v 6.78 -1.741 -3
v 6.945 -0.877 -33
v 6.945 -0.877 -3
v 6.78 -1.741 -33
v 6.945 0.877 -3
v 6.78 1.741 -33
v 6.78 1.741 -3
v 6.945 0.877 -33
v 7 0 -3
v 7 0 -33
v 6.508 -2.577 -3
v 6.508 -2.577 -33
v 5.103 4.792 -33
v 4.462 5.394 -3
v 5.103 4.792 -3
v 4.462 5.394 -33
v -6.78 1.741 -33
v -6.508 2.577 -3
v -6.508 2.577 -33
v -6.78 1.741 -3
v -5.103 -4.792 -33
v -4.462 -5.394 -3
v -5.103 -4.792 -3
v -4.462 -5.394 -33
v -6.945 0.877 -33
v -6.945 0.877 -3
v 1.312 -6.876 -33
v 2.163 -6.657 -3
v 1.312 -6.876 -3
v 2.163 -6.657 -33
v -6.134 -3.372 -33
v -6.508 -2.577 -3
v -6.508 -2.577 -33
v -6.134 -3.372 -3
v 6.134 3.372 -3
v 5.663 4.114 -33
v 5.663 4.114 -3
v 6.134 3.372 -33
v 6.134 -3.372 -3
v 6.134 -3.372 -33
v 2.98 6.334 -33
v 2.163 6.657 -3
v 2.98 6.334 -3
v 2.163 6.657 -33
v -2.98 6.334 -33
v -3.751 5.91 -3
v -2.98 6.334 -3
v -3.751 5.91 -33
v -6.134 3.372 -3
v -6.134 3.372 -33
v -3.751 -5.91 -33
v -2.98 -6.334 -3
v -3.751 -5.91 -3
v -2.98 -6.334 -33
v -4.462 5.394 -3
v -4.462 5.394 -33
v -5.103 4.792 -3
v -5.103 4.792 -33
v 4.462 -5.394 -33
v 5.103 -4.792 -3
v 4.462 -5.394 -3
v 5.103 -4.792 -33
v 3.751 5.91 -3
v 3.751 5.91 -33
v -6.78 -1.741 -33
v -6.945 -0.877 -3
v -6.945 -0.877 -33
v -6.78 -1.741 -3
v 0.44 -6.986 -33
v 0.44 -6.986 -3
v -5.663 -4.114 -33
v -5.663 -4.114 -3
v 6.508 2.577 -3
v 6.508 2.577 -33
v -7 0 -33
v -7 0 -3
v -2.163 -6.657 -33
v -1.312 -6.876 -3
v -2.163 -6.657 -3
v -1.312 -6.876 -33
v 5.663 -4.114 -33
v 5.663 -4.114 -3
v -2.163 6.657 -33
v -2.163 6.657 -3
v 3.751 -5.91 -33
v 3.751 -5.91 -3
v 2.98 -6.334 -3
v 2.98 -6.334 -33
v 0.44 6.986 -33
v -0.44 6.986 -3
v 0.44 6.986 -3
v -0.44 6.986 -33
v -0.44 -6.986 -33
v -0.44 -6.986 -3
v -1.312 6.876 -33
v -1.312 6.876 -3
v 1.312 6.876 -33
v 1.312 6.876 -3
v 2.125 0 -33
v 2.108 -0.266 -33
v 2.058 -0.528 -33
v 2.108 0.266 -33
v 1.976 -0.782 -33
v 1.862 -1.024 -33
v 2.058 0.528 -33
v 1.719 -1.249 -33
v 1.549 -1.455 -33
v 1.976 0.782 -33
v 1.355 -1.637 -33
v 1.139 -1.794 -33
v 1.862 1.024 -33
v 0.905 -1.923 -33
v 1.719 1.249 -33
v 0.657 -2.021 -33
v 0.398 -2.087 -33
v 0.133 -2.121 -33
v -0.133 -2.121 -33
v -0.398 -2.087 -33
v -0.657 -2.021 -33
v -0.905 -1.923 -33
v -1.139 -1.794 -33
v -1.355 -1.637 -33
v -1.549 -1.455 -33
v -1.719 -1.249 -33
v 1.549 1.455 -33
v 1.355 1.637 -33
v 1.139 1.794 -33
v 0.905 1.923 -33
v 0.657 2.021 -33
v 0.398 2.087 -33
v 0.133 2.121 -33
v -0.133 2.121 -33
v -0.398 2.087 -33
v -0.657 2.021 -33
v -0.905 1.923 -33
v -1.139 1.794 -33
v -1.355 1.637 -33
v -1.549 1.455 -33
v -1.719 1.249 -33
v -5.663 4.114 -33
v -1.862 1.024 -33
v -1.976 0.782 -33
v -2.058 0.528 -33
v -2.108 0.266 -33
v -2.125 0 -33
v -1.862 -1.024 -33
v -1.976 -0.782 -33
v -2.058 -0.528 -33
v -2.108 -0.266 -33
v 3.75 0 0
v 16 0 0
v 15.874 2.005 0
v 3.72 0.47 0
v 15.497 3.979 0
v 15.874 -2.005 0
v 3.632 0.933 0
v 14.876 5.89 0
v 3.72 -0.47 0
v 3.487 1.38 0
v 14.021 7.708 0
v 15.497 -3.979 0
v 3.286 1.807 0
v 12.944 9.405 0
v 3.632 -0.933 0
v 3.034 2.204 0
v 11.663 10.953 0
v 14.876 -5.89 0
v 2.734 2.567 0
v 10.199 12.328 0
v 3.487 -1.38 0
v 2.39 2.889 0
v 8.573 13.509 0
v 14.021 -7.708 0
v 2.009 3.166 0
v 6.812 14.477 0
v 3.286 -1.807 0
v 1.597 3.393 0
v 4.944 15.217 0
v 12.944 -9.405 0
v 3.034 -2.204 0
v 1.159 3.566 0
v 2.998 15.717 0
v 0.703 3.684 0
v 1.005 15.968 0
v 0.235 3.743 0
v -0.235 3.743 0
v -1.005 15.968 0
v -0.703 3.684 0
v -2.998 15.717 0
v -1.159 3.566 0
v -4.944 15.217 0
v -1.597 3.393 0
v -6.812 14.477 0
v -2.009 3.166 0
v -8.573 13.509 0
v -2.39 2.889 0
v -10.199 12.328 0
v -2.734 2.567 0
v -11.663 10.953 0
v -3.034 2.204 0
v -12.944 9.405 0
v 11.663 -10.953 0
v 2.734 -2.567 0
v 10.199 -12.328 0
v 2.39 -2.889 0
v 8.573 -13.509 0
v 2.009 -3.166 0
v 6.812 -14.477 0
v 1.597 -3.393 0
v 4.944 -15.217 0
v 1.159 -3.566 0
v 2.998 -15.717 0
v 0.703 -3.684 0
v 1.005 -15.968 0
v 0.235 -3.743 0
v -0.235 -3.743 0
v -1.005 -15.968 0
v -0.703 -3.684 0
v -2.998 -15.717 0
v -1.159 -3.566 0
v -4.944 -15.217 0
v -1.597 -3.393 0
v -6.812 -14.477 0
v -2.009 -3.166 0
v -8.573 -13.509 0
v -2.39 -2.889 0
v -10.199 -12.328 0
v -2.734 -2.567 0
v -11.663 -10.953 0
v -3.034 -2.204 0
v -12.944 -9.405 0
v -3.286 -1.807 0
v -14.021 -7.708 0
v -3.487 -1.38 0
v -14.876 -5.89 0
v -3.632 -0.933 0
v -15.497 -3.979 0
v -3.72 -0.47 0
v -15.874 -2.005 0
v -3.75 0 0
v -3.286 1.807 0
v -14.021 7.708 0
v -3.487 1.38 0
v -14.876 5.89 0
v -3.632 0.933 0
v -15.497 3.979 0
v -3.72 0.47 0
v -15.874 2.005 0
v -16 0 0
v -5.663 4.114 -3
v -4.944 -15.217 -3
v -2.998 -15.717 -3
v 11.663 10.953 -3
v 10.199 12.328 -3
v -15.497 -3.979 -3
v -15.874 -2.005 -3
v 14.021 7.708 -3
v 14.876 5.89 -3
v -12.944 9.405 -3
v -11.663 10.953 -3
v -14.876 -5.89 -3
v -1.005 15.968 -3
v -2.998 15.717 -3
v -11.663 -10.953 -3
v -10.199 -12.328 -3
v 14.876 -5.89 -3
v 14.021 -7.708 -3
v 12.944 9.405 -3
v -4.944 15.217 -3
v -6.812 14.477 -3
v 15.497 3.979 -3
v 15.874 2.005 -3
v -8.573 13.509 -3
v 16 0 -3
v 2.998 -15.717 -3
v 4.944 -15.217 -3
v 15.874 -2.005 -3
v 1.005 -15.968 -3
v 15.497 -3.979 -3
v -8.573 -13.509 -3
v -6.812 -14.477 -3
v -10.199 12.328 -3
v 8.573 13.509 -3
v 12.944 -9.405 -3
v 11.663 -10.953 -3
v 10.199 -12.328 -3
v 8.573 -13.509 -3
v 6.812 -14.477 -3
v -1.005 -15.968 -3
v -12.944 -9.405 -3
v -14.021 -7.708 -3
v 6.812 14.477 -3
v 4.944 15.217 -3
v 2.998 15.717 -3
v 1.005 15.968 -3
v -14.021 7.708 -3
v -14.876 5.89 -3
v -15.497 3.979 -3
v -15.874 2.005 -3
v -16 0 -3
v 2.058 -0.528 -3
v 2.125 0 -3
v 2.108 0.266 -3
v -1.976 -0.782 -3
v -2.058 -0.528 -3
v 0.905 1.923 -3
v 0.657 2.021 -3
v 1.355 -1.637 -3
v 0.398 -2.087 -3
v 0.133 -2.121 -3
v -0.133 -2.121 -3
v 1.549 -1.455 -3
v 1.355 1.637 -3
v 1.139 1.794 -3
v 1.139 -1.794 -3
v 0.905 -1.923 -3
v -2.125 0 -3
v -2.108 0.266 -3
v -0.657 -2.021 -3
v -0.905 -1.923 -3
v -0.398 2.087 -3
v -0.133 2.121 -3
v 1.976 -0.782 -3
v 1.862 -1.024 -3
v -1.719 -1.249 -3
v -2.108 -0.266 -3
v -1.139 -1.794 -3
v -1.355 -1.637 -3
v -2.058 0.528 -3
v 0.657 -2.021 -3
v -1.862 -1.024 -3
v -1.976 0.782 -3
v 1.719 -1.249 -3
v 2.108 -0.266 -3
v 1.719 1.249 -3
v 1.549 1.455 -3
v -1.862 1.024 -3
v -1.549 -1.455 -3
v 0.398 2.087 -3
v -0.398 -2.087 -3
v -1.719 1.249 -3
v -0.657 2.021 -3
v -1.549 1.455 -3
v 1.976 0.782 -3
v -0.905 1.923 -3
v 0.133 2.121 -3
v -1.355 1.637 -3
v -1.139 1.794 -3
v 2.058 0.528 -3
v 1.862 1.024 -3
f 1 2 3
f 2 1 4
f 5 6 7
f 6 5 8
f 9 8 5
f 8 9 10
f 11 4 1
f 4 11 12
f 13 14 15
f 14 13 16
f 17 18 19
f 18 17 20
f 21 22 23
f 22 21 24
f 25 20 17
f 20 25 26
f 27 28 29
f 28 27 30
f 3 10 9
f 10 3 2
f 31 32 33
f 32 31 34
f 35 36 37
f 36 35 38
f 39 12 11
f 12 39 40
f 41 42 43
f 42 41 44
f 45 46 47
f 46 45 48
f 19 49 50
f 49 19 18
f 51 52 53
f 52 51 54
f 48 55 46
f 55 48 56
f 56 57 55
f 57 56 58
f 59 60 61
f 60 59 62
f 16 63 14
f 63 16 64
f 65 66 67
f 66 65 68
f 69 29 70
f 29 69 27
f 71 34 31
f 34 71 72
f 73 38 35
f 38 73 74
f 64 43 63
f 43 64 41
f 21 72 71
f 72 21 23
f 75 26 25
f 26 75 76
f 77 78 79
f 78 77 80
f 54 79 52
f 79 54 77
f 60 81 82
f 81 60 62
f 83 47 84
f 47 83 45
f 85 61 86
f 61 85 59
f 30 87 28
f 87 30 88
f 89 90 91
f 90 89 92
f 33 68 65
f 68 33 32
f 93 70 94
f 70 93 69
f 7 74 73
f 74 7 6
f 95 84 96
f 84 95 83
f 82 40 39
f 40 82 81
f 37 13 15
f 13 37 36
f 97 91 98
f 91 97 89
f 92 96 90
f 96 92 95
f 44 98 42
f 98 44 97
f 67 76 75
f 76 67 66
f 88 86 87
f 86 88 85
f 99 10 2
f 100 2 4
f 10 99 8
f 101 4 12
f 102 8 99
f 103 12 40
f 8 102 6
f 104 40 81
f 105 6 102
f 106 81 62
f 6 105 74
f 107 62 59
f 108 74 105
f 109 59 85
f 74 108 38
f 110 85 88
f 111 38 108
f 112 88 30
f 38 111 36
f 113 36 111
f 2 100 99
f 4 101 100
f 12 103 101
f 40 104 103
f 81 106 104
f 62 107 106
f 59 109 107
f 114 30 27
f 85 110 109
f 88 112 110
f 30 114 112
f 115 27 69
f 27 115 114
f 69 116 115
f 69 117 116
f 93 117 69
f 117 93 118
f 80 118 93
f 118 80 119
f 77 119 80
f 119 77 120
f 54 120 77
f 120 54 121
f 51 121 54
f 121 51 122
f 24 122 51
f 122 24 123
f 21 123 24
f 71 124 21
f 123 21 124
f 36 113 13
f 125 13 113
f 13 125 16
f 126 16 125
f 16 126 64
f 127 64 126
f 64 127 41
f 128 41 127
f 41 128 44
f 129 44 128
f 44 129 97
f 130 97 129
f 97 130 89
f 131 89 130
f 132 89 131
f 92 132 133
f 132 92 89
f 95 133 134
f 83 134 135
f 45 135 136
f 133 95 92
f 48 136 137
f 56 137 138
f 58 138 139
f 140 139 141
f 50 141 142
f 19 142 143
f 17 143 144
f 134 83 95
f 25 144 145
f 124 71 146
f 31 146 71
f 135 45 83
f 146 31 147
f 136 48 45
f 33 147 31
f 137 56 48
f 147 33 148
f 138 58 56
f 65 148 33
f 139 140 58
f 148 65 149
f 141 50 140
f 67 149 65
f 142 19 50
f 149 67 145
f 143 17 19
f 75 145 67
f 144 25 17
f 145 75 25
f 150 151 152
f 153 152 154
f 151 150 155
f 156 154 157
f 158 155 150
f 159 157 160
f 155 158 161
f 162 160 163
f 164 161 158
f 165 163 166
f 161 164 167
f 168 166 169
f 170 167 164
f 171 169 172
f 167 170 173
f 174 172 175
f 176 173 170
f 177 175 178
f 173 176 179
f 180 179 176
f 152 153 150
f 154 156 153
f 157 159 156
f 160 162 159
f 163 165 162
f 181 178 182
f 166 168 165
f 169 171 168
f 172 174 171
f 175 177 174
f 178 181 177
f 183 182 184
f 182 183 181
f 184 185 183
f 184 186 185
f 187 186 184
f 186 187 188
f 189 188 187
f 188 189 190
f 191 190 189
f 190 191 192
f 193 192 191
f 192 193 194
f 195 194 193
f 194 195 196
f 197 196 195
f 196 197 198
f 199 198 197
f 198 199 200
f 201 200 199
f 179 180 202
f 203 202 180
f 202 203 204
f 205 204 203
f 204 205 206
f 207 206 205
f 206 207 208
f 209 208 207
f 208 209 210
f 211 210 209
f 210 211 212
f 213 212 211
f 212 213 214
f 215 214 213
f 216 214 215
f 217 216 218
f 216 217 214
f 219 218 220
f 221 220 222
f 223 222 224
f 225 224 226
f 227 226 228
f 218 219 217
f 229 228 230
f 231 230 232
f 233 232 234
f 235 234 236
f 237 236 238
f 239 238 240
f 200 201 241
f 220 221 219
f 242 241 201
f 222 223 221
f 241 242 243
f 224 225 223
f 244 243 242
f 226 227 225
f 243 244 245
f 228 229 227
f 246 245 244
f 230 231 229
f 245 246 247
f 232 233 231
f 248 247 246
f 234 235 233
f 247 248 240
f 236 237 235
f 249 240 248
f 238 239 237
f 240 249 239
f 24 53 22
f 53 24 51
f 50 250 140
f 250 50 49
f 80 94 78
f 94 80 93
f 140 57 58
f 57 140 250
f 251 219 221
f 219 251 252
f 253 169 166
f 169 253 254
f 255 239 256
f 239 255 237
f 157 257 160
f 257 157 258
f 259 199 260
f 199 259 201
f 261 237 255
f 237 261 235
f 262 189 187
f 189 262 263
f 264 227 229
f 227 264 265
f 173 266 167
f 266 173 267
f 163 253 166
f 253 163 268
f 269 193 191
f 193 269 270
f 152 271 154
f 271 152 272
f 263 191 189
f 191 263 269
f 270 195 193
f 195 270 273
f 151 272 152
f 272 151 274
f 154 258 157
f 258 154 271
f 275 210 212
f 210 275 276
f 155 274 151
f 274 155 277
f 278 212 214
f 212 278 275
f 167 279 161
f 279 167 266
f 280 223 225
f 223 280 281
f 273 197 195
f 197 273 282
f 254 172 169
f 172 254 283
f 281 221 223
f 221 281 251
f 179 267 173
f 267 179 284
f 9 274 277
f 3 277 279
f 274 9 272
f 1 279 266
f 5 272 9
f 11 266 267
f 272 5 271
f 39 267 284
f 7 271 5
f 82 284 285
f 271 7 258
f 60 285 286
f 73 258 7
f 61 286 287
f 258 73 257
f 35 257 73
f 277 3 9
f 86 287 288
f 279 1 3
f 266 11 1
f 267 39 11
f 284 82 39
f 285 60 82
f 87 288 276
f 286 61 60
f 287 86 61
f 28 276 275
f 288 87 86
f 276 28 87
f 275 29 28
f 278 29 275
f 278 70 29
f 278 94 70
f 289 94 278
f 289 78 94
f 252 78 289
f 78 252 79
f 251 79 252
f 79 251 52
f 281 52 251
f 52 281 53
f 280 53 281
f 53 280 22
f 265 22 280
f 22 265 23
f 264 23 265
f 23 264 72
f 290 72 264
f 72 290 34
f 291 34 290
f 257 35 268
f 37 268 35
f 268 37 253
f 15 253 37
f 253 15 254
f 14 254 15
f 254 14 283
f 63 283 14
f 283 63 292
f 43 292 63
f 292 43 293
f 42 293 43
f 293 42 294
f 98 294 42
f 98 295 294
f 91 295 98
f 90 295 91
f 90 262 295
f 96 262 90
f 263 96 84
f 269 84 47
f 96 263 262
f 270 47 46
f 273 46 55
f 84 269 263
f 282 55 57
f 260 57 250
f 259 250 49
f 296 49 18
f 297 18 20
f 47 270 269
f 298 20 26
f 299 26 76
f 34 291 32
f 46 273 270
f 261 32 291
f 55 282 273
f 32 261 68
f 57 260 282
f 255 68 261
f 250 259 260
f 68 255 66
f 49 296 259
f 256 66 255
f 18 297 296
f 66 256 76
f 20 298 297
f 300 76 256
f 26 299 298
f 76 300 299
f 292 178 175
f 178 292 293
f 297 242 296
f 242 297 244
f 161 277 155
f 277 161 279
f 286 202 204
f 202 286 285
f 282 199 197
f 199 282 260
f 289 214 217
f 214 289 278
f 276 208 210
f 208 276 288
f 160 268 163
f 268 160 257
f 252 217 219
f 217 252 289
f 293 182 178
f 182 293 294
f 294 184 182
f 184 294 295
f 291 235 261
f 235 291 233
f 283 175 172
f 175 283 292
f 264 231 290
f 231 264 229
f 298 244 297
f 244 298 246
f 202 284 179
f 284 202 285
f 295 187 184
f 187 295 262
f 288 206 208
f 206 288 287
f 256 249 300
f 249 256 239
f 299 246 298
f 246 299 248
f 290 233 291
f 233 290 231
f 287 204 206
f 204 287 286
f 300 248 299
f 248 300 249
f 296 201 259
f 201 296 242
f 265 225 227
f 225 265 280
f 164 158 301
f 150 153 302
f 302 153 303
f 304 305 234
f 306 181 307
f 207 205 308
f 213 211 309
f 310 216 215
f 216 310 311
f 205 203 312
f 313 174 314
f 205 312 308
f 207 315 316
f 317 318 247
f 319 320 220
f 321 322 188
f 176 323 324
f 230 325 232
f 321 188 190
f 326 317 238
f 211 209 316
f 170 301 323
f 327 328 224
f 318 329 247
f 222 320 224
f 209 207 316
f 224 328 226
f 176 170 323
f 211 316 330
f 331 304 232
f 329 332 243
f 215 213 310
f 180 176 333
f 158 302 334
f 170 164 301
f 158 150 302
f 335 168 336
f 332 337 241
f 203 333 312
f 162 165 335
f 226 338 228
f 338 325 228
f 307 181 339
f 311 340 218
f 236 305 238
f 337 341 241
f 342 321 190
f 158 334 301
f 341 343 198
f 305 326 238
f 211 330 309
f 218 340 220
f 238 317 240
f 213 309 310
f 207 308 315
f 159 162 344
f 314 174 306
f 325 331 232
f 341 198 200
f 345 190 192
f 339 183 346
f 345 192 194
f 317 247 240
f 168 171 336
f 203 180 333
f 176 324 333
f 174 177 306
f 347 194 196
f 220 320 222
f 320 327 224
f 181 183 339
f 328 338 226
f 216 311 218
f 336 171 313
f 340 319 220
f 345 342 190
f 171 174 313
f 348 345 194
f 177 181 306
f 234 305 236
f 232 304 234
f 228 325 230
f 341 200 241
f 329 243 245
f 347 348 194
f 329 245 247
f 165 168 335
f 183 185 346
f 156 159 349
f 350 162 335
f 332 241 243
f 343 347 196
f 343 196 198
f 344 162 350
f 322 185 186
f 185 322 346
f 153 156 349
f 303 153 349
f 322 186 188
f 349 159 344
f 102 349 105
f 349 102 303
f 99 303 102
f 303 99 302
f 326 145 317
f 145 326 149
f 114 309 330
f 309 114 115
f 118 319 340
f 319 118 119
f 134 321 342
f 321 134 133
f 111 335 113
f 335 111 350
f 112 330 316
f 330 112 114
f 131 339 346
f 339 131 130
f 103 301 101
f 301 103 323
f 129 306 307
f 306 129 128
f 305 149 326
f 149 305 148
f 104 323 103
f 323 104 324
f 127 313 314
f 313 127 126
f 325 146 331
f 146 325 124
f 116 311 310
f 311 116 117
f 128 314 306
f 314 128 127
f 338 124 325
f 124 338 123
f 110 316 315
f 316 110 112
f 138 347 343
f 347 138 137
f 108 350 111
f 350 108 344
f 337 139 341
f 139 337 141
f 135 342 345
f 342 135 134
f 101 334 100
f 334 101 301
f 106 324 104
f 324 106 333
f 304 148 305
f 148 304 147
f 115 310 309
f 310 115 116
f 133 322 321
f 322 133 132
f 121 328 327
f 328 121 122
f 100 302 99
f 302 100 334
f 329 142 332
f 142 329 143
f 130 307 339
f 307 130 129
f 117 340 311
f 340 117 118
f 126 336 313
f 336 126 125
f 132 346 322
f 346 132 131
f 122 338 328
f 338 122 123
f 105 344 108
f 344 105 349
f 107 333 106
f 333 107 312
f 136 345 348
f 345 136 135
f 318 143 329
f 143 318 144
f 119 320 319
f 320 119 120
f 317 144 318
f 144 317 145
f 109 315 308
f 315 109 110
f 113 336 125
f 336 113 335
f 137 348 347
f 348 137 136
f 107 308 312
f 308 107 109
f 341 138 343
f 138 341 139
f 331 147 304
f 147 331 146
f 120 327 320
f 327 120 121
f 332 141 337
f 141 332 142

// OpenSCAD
$fn = 50;


difference() {
	union() {
		translate(v = [0, 0, -33.0000000000]) {
			cylinder(h = 33, r = 7.0000000000);
		}
		translate(v = [0, 0, -3.0000000000]) {
			cylinder(h = 3, r = 16.0000000000);
		}
	}
	union() {
		translate(v = [0, 0, 0]) {
			rotate(a = [0, 0, 0]) {
				difference() {
					union() {
						#translate(v = [0, 0, -33.0000000000]) {
							cylinder(h = 33, r = 2.0000000000);
						}
						#translate(v = [0, 0, -3]) {
							cylinder(h = 3, r = 7.0000000000, r1 = 2.1250000000, r2 = 3.7500000000);
						}
						#translate(v = [0, 0, -33.0000000000]) {
							cylinder(h = 33, r = 2.1250000000);
						}
						#translate(v = [0, 0, -33.0000000000]) {
							cylinder(h = 33, r = 2.0000000000);
						}
					}
					union();
				}
			}
		}
	}
}
